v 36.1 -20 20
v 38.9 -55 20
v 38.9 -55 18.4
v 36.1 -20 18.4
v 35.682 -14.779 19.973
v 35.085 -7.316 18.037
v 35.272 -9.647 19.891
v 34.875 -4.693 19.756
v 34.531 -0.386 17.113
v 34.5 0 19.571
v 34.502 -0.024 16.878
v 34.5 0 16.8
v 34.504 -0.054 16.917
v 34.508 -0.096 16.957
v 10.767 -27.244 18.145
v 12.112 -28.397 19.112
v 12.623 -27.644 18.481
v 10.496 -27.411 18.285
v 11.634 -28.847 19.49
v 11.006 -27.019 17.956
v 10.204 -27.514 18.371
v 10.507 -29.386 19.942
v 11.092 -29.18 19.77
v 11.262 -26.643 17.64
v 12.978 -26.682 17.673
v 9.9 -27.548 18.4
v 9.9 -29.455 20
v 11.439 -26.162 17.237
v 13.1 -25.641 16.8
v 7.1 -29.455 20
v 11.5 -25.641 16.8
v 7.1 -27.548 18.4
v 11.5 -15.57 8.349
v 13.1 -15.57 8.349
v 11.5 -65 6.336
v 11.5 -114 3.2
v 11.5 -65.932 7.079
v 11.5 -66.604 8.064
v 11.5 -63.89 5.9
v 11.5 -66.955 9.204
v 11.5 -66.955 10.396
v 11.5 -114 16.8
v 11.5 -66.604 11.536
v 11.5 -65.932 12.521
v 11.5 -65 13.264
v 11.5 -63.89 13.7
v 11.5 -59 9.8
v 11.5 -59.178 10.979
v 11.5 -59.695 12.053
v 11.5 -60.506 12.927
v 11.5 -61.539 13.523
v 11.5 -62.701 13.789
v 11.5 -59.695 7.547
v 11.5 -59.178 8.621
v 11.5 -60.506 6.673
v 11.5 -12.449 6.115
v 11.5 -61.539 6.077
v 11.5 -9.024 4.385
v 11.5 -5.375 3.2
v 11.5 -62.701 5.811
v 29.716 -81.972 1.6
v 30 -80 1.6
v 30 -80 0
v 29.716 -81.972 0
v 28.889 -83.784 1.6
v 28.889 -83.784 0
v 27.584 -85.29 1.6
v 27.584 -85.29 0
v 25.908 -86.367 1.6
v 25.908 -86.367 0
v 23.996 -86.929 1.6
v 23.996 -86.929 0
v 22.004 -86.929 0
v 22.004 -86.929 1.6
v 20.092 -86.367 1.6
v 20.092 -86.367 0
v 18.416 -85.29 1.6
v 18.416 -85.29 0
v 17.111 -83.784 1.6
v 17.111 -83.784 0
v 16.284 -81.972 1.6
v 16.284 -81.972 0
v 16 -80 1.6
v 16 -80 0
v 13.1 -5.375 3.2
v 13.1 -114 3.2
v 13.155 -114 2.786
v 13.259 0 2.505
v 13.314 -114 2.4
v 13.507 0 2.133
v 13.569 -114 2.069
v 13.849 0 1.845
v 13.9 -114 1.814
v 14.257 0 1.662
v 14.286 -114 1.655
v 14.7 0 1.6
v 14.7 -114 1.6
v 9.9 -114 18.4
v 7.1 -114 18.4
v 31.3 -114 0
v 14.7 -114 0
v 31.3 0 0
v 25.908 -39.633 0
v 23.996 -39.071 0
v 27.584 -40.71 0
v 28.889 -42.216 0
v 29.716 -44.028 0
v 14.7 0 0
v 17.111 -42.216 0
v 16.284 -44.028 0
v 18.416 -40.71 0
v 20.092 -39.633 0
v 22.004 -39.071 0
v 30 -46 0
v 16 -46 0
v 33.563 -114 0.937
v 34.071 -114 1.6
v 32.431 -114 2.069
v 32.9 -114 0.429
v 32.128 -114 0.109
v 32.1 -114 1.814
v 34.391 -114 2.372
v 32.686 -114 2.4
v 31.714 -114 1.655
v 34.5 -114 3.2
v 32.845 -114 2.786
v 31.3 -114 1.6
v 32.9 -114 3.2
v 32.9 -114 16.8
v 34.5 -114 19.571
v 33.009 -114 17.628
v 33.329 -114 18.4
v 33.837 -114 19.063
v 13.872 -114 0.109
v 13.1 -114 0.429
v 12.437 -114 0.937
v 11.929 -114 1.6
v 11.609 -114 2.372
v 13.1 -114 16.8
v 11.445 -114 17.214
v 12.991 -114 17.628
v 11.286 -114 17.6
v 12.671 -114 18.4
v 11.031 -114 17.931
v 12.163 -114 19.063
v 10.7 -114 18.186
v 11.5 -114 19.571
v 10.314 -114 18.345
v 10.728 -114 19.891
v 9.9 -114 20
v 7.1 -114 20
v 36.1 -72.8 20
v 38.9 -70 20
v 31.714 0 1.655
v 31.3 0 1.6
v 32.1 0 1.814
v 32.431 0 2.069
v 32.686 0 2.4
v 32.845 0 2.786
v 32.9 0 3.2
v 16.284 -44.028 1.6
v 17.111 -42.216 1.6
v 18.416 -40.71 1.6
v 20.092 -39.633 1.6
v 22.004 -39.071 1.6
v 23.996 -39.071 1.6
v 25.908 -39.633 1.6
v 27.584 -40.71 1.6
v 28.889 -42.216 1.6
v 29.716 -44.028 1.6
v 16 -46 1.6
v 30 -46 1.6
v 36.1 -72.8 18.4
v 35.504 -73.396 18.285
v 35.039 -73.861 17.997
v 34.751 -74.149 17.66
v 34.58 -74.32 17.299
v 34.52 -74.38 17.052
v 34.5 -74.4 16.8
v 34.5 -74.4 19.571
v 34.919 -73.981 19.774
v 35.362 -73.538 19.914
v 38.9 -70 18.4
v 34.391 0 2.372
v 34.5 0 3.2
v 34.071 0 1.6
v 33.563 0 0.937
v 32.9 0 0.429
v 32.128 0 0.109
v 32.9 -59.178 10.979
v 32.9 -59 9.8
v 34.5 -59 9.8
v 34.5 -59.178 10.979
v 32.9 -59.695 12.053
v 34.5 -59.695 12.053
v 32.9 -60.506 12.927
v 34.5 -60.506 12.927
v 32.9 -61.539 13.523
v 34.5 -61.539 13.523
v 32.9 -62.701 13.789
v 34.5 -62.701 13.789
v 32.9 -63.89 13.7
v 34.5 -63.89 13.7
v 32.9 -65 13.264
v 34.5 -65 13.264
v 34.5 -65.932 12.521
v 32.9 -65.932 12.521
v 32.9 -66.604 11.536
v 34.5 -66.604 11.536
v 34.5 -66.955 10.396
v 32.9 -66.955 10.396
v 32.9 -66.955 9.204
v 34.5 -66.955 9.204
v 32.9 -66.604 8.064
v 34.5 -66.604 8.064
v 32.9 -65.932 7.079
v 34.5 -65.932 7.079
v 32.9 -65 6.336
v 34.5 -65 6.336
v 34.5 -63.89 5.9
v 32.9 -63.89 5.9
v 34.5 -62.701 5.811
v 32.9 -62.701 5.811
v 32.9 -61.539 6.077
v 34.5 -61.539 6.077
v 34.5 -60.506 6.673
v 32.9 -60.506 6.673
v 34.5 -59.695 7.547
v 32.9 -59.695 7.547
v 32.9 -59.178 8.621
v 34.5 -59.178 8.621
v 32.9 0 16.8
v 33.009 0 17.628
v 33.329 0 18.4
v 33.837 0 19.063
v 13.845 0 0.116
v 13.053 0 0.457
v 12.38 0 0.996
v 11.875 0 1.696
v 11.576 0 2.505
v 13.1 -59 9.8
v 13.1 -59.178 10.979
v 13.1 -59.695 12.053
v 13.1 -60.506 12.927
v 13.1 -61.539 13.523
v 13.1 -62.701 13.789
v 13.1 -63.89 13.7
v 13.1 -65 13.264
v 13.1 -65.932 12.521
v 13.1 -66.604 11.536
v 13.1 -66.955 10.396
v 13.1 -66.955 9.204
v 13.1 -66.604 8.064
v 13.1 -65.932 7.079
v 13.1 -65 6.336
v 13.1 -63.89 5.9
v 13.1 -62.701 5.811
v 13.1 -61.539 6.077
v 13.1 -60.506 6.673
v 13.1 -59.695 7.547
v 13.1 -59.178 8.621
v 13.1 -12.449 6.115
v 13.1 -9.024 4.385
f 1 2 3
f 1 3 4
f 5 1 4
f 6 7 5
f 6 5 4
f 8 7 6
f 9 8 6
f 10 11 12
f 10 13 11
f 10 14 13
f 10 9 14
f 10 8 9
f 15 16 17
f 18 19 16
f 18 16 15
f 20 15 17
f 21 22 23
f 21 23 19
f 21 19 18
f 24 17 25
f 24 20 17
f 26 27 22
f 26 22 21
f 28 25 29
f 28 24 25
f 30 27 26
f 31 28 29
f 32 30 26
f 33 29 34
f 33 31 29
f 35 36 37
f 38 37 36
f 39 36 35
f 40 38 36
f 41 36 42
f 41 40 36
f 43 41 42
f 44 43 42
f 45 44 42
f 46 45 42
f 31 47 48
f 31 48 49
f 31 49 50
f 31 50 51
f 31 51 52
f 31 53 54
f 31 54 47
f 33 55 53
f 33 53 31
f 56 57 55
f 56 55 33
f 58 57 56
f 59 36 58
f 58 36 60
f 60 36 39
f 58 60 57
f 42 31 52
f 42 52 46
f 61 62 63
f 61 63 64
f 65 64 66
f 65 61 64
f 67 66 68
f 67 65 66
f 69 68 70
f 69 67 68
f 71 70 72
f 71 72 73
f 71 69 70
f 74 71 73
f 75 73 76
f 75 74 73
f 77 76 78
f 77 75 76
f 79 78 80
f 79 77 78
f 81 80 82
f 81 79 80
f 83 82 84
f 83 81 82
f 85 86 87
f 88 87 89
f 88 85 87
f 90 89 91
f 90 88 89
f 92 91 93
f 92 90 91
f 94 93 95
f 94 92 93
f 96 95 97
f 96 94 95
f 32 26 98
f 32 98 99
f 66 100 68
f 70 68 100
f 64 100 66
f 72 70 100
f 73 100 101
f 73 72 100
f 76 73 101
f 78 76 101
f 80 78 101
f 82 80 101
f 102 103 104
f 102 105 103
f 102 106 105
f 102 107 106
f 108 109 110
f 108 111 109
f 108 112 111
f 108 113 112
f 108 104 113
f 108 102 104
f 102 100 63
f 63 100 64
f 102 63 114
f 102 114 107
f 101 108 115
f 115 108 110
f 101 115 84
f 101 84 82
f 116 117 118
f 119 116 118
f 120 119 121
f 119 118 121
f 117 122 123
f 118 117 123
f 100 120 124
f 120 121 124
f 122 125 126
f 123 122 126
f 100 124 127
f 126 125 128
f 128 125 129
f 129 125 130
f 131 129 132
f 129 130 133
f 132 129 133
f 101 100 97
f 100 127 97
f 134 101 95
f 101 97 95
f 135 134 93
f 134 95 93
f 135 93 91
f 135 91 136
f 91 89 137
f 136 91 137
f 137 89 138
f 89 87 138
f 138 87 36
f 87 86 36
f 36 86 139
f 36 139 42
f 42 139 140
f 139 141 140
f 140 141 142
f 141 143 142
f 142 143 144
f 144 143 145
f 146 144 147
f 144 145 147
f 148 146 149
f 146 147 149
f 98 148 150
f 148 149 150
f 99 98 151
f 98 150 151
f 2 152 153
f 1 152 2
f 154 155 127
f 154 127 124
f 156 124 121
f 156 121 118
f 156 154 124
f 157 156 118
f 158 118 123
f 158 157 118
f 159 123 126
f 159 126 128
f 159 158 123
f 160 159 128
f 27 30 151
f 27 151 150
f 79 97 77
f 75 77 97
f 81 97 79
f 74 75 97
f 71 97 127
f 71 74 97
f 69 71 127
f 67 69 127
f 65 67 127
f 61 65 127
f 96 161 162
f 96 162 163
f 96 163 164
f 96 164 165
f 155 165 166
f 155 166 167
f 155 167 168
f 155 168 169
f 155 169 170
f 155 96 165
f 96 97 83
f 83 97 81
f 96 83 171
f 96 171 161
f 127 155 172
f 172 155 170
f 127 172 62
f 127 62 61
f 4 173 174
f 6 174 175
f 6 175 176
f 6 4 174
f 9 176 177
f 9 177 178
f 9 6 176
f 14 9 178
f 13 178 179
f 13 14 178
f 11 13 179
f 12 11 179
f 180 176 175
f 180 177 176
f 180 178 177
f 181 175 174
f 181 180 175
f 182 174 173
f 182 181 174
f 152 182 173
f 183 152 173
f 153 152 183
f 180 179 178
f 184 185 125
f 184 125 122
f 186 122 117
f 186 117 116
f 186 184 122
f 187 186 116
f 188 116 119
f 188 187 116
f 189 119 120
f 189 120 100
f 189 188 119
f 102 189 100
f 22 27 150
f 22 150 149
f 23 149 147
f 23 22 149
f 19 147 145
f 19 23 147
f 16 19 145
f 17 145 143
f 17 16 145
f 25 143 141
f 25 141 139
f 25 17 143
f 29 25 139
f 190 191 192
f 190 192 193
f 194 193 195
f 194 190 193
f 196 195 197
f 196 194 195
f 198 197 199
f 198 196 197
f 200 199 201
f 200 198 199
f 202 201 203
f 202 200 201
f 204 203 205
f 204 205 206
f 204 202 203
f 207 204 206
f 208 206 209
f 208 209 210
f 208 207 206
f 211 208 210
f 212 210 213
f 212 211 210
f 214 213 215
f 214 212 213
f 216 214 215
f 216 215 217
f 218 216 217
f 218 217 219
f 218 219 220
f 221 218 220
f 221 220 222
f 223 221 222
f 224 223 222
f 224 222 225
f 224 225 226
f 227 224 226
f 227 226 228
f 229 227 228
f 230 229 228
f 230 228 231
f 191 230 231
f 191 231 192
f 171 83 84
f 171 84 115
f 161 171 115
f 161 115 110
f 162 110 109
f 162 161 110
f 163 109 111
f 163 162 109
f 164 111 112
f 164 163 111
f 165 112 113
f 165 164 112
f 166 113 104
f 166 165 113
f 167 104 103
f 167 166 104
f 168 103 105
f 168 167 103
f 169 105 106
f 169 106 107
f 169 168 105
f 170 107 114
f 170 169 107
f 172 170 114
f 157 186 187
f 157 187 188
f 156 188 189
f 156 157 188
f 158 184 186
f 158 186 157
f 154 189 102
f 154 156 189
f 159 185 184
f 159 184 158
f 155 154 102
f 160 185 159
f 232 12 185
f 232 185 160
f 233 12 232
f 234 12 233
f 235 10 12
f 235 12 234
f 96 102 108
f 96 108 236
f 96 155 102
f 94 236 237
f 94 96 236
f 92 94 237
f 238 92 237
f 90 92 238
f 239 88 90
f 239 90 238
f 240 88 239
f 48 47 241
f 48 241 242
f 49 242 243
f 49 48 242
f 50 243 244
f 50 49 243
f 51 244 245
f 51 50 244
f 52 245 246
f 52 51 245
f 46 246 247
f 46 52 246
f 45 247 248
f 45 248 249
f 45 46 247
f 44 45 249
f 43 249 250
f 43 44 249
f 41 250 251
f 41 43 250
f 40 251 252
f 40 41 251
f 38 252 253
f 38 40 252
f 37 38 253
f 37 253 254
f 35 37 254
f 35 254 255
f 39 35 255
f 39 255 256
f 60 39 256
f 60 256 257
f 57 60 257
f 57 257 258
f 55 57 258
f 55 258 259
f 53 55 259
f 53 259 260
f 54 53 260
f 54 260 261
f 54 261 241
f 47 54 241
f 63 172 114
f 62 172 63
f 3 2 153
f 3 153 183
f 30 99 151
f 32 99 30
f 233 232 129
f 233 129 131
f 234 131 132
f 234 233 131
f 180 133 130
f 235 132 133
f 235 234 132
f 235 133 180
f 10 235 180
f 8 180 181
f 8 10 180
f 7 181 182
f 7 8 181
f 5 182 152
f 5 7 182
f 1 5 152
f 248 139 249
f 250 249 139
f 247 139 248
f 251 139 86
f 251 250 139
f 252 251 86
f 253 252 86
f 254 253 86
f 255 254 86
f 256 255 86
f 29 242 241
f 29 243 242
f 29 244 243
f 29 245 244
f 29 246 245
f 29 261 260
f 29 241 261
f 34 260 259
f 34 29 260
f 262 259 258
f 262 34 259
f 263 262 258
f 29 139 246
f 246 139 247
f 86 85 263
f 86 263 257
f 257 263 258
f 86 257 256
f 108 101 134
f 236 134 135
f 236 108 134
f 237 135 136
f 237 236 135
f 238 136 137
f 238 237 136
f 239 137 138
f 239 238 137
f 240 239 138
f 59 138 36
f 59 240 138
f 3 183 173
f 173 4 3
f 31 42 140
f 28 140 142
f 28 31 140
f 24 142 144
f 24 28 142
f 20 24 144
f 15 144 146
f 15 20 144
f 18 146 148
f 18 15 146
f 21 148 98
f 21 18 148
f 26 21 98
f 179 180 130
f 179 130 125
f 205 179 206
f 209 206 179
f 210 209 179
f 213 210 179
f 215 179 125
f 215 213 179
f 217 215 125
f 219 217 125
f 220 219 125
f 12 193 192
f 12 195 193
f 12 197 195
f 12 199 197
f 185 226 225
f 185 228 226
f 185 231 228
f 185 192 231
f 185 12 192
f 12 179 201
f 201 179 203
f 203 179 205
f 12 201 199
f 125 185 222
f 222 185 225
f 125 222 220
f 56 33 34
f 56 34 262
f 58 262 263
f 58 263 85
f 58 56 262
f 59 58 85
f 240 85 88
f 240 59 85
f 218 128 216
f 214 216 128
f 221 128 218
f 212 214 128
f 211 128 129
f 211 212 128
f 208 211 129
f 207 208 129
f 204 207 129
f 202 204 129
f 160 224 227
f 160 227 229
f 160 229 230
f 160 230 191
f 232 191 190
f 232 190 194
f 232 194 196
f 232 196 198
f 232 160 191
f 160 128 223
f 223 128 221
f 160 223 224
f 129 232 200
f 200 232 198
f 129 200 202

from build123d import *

# Parameters (mm, degrees)
F1_DEPTH = 114
F3_DEPTH = 25
F5_DEPTH = 5
F6_R     = 4
F7_DEPTH = 30
F9_DEPTH = 5


with BuildPart() as f1:
    # F0 (on Front) → F1 (new body)
    with BuildSketch(Plane.XZ):
        with BuildLine():
            ThreePointArc((-11.5, 3.2), (-10.5627416998, 0.9372583002), (-8.3, 0))
            Line((-8.3, 0), (0, 0))
            Line((0, 0), (8.3, 0))
            ThreePointArc((8.3, 0), (10.5627416998, 0.9372583002), (11.5, 3.2))
            Line((11.5, 3.2), (11.5, 16.8))
            ThreePointArc((11.5, 16.8), (11.9686291501, 17.9313708499), (13.1, 18.4))
            Line((13.1, 18.4), (15.9, 18.4))
            Line((15.9, 18.4), (15.9, 20))
            Line((15.9, 20), (13.1, 20))
            ThreePointArc((13.1, 20), (10.8372583002, 19.0627416998), (9.9, 16.8))
            Line((9.9, 16.8), (9.9, 3.2))
            ThreePointArc((9.9, 3.2), (9.4313708499, 2.0686291501), (8.3, 1.6))
            Line((8.3, 1.6), (0, 1.6))
            Line((0, 1.6), (-8.3, 1.6))
            ThreePointArc((-8.3, 1.6), (-9.4313708499, 2.0686291501), (-9.9, 3.2))
            Line((-9.9, 3.2), (-9.9, 16.8))
            ThreePointArc((-9.9, 16.8), (-10.8372583002, 19.0627416998), (-13.1, 20))
            Line((-13.1, 20), (-15.9, 20))
            Line((-15.9, 20), (-15.9, 18.4))
            Line((-15.9, 18.4), (-13.1, 18.4))
            ThreePointArc((-13.1, 18.4), (-11.9686291501, 17.9313708499), (-11.5, 16.8))
            Line((-11.5, 16.8), (-11.5, 3.2))
        make_face()
    extrude(amount=F1_DEPTH)

    # F2 (on face) → F3 (cut)
    with BuildSketch(Plane.XY.offset(1.6)):
        with BuildLine():
            ThreePointArc((-7, -46), (0, -53), (7, -46))
            Line((7, -46), (-7, -46))
        make_face()
        with BuildLine():
            Line((-7, -46), (7, -46))
            ThreePointArc((7, -46), (0, -39), (-7, -46))
        make_face()
        with BuildLine():
            Line((7, -80), (7, -46))
            ThreePointArc((7, -46), (0, -53), (-7, -46))
            Line((-7, -46), (-7, -80))
            ThreePointArc((-7, -80), (0, -73), (7, -80))
        make_face()
        with BuildLine():
            ThreePointArc((-7, -80), (0, -87), (7, -80))
            Line((7, -80), (-7, -80))
        make_face()
        with BuildLine():
            Line((-7, -80), (7, -80))
            ThreePointArc((7, -80), (0, -73), (-7, -80))
        make_face()
    extrude(amount=-F3_DEPTH, mode=Mode.SUBTRACT)

    # F4 (on face) → F5 (cut)
    with BuildSketch(Plane.XY.offset(20)):
        Polygon((-11.5, 0), (-15.9, 0), (-15.9, -55), align=None)
        Polygon((-11.5, -74.4), (-15.9, -70), (-15.9, -114), (-11.5, -114), align=None)
    extrude(amount=-F5_DEPTH, mode=Mode.SUBTRACT)

    # F6 (on face) → F7 (cut)
    with BuildSketch(Plane.YZ.offset(11.5)):
        with Locations((-63, 9.8)):
            Circle(F6_R)
    extrude(amount=-F7_DEPTH, mode=Mode.SUBTRACT)

    # F8 (on face) → F9 (cut, symmetric)
    with BuildSketch(Plane.YZ.offset(11.5)):
        with BuildLine():
            Line((-38.3930956715, 27.5), (-15.5696902422, 8.348888922))
            ThreePointArc((-15.5696902422, 8.348888922), (-8.0505035831, 4.0076844804), (0.5, 2.5))
            Line((0.5, 2.5), (5, 2.5))
            Line((5, 2.5), (5, 27.5))
            Line((5, 27.5), (-38.3930956715, 27.5))
        make_face()
    extrude(amount=F9_DEPTH, both=True, mode=Mode.SUBTRACT)


with BuildPart() as f10_1:
    # F10: instance of F1
    add(f1.part.mirror(Plane.YZ.offset(11.5)))


solid = f10_1.part
